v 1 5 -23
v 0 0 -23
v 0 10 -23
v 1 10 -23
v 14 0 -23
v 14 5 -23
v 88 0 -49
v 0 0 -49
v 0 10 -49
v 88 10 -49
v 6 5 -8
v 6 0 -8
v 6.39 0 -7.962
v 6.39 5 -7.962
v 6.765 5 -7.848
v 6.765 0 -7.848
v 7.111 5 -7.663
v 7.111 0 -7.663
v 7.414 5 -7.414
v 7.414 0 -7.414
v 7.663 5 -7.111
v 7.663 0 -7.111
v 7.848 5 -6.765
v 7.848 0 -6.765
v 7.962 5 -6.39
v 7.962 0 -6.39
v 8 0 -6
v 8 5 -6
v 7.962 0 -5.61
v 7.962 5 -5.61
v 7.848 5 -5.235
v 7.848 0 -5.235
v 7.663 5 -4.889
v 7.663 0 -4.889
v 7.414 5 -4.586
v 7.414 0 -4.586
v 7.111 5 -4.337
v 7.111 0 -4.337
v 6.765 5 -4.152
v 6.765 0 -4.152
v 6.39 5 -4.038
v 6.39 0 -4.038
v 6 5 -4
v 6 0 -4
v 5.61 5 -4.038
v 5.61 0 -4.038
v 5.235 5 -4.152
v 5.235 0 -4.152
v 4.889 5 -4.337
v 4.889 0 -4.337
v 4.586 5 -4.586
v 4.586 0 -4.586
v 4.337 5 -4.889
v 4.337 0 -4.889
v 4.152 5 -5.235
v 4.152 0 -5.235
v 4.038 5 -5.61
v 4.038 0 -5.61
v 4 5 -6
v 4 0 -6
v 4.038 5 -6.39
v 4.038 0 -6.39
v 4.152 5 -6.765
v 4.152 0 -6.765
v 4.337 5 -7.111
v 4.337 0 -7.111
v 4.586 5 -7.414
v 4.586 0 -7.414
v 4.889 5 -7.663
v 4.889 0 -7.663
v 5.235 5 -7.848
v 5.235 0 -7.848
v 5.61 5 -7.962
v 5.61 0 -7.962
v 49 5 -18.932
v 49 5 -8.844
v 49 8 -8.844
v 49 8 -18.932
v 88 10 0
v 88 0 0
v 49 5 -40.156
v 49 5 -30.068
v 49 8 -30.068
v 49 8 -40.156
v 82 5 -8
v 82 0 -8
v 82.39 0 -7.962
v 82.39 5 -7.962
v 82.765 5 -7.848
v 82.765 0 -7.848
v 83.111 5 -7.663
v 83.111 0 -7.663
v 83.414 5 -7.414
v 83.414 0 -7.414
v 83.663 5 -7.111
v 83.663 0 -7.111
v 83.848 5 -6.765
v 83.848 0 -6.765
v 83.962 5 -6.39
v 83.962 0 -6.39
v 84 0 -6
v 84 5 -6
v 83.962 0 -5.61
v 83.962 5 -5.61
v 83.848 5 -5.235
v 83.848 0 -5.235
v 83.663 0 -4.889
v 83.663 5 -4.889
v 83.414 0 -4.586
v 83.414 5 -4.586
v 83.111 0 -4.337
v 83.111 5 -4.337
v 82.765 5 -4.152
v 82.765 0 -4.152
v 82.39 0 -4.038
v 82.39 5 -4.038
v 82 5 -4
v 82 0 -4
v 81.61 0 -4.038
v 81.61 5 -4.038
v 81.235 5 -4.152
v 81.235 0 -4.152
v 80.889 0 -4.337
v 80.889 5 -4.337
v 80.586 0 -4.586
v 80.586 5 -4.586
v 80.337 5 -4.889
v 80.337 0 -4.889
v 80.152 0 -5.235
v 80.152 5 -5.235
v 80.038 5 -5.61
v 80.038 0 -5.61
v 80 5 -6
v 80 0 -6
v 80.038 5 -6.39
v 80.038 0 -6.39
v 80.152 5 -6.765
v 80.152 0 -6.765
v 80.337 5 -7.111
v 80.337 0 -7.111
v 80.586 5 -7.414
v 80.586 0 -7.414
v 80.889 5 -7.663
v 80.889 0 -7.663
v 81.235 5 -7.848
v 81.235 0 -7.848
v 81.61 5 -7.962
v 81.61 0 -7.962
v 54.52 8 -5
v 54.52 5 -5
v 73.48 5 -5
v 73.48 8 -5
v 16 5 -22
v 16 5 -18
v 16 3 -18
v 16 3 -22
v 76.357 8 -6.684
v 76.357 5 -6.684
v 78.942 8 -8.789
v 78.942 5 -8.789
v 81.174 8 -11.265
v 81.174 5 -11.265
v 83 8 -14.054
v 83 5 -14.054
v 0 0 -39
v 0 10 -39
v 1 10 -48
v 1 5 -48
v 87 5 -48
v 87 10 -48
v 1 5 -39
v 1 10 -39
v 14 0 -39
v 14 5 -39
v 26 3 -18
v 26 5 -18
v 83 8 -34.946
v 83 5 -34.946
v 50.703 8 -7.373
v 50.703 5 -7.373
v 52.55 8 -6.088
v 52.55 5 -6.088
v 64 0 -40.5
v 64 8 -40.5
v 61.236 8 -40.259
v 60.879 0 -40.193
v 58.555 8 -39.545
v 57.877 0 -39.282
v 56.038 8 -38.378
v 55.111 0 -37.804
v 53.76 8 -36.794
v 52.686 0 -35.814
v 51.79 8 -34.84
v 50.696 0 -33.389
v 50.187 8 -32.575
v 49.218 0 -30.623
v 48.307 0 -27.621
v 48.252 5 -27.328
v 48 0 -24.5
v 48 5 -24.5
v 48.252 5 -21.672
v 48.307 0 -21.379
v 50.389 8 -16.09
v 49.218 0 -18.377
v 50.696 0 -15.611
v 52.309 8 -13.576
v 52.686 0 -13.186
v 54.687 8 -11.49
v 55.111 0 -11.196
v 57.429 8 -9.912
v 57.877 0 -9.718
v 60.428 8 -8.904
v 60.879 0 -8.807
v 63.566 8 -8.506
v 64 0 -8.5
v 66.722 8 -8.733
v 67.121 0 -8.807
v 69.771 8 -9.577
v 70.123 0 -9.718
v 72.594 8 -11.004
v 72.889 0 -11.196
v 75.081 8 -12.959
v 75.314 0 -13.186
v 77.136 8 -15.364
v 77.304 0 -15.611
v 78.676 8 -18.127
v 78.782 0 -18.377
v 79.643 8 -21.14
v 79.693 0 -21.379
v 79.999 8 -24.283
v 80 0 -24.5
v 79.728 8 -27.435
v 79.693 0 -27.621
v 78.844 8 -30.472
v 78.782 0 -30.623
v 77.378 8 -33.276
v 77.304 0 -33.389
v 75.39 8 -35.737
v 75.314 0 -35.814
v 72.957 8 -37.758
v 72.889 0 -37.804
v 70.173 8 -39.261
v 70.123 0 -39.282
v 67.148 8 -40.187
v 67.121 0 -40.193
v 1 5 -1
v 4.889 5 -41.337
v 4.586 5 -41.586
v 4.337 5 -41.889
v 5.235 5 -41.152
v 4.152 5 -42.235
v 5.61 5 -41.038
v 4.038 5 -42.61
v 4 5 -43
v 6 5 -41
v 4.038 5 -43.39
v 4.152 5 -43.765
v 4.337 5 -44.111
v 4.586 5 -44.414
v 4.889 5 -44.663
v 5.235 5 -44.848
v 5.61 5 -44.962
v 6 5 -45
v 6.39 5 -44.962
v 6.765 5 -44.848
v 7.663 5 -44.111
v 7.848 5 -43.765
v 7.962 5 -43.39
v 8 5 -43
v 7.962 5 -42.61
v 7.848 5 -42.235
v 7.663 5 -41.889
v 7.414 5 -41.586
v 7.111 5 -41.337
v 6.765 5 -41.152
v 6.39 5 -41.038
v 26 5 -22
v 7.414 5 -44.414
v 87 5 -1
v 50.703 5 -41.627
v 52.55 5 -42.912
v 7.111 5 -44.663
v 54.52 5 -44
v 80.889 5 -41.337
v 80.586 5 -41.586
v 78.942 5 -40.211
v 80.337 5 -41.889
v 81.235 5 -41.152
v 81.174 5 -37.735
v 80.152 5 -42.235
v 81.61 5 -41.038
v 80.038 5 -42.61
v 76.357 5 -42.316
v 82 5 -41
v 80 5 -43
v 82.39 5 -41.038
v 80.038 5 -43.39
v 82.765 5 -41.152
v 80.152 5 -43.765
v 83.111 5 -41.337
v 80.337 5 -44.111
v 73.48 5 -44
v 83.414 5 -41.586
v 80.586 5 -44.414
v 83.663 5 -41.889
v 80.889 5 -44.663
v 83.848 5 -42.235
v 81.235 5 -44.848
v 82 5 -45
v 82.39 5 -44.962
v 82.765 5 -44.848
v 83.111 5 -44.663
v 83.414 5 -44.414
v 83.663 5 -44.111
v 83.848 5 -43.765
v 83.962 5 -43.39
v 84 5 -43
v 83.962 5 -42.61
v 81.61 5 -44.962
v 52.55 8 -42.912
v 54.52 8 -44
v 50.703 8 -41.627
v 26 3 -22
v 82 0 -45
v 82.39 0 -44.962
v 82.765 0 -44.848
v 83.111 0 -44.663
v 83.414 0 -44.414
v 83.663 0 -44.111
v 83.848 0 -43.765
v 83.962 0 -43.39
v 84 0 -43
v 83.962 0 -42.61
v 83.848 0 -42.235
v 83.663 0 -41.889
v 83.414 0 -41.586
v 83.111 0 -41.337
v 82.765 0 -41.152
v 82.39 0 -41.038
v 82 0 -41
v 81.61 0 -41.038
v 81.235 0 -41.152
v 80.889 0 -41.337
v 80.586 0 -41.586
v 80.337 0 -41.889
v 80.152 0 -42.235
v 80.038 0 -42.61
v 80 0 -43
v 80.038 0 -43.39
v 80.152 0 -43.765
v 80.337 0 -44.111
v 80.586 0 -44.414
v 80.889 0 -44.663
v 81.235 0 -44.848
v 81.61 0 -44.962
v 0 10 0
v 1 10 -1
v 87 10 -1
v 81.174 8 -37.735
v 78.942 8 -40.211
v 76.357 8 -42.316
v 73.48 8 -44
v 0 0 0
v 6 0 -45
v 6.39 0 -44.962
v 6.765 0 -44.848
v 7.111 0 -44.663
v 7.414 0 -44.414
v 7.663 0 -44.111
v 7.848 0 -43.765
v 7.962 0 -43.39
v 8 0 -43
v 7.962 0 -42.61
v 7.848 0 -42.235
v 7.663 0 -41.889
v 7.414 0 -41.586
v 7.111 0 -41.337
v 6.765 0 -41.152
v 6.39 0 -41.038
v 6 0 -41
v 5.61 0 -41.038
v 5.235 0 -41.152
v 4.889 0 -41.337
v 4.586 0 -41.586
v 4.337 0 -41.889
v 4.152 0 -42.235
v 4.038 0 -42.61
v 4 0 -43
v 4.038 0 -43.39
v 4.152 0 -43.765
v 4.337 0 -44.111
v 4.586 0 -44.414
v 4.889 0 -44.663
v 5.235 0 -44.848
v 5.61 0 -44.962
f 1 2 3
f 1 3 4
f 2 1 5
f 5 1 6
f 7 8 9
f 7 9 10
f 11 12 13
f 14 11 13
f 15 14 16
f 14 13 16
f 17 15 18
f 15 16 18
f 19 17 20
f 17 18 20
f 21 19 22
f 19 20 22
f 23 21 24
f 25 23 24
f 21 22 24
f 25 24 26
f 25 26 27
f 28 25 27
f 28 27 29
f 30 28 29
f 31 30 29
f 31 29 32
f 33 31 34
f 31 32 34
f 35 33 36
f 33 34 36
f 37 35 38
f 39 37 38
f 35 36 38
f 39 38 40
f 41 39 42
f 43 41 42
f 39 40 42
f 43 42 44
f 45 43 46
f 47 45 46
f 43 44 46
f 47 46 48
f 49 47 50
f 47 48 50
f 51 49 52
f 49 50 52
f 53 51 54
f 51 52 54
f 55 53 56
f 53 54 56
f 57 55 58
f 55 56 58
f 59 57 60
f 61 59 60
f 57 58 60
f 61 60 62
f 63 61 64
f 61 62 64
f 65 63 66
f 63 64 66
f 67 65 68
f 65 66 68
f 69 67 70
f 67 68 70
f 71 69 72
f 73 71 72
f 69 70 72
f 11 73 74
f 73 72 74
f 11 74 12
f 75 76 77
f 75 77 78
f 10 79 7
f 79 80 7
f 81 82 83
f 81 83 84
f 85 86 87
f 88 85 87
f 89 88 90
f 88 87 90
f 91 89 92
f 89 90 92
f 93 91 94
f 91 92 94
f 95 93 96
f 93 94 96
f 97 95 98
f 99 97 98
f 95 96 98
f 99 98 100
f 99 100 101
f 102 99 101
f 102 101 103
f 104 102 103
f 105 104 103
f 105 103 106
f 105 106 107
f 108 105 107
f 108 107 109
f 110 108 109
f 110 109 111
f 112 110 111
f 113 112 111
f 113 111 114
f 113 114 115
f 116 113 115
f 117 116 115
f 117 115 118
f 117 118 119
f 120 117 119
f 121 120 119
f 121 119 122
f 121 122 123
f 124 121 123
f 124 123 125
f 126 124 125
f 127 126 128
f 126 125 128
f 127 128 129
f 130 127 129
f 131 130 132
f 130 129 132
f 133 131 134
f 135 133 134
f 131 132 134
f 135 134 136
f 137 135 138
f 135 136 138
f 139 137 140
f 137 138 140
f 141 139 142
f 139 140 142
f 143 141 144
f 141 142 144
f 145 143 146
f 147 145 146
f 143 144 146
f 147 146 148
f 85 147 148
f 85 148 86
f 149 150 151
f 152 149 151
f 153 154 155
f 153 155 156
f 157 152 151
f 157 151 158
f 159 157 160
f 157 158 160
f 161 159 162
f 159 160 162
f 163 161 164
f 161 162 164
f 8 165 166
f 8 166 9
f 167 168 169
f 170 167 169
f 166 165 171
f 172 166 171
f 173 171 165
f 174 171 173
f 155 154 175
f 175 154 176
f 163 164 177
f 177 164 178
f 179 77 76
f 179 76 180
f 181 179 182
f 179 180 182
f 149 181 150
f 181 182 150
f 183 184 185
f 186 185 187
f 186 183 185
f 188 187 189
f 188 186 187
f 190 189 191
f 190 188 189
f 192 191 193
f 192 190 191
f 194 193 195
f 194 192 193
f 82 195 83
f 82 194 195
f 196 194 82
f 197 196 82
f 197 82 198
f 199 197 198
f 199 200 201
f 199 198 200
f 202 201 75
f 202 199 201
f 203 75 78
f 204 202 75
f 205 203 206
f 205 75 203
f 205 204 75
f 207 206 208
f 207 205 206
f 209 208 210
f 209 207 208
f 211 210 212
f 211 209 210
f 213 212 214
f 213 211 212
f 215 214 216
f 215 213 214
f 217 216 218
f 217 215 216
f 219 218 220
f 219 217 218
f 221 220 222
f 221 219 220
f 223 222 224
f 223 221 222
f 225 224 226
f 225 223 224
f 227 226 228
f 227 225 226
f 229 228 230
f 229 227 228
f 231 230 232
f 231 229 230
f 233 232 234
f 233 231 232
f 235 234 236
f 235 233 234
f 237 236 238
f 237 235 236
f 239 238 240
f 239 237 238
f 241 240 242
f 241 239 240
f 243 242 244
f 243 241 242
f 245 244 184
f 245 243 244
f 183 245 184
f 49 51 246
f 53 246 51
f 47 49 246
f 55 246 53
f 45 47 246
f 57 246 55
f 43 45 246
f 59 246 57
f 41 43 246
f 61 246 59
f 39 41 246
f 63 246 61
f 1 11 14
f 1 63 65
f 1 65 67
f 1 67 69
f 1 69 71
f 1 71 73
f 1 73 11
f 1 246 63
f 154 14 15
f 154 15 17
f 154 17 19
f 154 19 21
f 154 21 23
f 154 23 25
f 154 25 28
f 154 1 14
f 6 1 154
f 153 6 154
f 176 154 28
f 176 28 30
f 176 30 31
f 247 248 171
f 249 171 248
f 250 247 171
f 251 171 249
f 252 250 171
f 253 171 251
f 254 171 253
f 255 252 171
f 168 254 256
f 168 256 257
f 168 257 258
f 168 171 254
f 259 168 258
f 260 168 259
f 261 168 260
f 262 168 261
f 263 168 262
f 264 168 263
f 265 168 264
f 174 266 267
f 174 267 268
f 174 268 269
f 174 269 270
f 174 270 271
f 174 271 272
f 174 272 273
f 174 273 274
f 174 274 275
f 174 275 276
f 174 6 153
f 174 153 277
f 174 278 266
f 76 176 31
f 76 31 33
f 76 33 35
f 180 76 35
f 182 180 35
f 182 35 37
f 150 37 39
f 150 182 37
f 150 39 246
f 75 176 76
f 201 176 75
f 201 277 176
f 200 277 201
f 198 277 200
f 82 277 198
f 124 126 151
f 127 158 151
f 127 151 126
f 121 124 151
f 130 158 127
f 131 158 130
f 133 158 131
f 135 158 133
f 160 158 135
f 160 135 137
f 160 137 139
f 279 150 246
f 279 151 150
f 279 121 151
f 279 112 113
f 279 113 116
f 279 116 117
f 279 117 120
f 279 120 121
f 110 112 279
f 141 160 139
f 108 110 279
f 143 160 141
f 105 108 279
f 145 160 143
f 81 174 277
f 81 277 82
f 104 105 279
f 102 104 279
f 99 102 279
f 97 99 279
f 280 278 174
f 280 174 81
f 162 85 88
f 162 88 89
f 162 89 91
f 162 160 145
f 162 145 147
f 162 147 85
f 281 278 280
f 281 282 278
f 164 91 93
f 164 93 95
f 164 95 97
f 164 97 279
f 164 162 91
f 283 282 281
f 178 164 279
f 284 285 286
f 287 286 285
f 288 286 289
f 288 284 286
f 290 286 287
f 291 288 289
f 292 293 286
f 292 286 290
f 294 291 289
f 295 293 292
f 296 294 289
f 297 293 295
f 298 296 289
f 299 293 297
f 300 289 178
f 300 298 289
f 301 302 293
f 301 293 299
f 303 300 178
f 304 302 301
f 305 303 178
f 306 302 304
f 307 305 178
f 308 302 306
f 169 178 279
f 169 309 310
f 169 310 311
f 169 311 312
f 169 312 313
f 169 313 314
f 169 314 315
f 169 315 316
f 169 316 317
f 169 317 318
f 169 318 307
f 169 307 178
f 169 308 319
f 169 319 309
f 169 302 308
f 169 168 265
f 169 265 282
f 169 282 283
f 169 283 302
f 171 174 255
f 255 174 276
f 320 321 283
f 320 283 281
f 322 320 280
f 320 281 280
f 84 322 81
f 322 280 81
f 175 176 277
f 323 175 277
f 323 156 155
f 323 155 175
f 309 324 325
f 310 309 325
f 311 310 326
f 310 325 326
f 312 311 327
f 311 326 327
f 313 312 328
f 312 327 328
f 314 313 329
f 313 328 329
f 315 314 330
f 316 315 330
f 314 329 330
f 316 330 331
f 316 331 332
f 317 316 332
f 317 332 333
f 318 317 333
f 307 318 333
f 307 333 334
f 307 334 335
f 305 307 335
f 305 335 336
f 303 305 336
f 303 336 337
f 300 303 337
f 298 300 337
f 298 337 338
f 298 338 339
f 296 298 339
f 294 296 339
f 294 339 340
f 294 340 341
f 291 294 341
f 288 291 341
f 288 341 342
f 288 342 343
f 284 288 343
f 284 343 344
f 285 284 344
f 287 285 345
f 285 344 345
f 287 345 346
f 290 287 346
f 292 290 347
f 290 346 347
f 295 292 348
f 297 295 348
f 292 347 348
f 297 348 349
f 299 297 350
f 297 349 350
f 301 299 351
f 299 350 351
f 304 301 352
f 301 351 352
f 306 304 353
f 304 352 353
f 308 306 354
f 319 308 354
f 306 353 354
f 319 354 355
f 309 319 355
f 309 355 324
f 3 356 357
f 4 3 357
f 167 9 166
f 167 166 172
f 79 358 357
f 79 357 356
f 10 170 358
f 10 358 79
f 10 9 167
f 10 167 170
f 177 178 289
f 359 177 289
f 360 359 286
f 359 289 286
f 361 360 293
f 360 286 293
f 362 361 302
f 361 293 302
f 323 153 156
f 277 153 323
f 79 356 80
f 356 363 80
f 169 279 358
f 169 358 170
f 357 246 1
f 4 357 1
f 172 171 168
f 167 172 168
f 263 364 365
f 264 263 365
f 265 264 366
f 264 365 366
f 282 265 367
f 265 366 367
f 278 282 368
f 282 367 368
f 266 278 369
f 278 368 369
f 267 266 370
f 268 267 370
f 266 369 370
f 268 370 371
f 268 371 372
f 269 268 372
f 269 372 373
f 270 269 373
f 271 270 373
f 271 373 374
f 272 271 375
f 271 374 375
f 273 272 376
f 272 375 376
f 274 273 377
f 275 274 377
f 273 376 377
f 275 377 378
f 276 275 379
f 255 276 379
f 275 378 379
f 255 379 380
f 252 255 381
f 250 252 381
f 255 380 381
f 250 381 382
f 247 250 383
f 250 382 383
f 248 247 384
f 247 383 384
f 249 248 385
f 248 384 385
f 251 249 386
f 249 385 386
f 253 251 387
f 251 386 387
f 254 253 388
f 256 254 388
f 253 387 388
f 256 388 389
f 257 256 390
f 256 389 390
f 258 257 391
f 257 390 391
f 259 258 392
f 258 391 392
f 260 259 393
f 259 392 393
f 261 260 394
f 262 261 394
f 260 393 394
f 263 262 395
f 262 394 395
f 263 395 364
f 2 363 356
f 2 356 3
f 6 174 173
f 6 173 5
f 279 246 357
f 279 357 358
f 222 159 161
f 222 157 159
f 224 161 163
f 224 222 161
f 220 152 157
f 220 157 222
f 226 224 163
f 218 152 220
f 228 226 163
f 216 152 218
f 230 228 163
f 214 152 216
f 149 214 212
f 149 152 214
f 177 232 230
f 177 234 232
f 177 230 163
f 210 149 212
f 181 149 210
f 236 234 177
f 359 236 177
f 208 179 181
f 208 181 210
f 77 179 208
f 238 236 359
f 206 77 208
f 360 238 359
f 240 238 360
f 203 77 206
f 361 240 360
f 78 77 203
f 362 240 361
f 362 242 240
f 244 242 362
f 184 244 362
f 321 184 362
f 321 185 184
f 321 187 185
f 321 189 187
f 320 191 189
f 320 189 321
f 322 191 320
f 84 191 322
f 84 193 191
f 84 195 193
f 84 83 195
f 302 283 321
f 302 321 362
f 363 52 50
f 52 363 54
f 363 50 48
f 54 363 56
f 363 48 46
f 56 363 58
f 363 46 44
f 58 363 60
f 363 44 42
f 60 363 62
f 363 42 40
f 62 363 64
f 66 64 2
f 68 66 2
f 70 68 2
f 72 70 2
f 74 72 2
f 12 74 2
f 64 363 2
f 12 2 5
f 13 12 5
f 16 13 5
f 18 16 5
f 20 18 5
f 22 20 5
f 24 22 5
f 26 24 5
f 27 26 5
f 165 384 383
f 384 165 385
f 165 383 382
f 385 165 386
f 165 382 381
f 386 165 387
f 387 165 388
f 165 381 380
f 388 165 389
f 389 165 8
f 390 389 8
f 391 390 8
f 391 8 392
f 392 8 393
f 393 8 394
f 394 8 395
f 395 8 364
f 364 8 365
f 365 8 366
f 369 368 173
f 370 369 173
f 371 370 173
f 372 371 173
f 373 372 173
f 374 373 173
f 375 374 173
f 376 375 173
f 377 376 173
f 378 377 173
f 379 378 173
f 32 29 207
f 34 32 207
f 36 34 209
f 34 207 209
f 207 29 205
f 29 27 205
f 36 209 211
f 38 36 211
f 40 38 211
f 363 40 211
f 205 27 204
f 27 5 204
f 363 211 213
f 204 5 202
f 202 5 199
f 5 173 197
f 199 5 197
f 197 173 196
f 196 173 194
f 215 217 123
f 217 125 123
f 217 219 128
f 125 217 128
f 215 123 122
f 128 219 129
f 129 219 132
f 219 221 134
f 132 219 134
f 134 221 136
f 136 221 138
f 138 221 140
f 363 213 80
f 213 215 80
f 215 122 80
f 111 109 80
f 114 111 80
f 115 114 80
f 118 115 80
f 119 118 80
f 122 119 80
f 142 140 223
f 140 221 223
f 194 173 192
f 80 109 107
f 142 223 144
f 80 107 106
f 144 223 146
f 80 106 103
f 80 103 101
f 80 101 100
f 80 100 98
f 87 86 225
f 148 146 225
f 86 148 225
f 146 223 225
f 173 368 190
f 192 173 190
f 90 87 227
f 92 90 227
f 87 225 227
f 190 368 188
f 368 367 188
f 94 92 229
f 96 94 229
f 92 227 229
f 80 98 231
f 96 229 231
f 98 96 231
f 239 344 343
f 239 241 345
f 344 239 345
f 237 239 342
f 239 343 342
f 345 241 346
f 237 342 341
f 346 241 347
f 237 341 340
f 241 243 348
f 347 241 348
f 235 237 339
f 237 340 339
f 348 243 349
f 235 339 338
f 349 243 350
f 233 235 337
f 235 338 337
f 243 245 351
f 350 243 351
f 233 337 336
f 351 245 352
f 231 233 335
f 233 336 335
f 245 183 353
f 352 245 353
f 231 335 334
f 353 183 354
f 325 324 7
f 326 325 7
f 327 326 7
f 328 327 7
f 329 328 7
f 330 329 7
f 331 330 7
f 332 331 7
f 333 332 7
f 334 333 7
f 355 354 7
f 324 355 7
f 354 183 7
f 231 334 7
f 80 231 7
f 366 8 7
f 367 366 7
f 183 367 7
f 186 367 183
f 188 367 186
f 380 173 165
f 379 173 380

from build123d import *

# Parameters (mm, degrees)
SKETCH1_W           = 88
SKETCH1_H           = 49
BOSS_EXTRUDE1_DEPTH = 5
SKETCH2_W           = 88
SKETCH2_H           = 49
SKETCH2_W_2         = 86
SKETCH2_H_2         = 47
BOSS_EXTRUDE2_DEPTH = 5
SKETCH3_R           = 16
CUT_EXTRUDE1_DEPTH  = 5
CUT_EXTRUDE2_START  = -10
SKETCH4_W           = 14
SKETCH4_H           = 16
CUT_EXTRUDE2_DEPTH  = 10
SKETCH5_W           = 10
SKETCH5_H           = 4
CUT_EXTRUDE3_DEPTH  = 2
SKETCH6_R           = 21.682235108
SKETCH6_R_2         = 16
BOSS_EXTRUDE3_DEPTH = 3
SKETCH7_W           = 10
SKETCH7_H           = 35.531306717
CUT_EXTRUDE4_DEPTH  = 3
SKETCH8_R           = 2
CUT_EXTRUDE5_DEPTH  = 5
SKETCH9_W           = 40.675164953
SKETCH9_H           = 47
SKETCH9_W_2         = 34.982420928
SKETCH9_H_2         = 39
CUT_EXTRUDE6_DEPTH  = 3


with BuildPart() as part:
    # Sketch1 → Boss-Extrude1 (new body)
    with BuildSketch(Plane(origin=(0, 0, 0), x_dir=(1, 0, 0), z_dir=(0, 1, 0))):
        with Locations((44, 24.5)):
            Rectangle(SKETCH1_W, SKETCH1_H)
    extrude(amount=BOSS_EXTRUDE1_DEPTH)

    # Sketch2 → Boss-Extrude2 (add)
    with BuildSketch(Plane(origin=(0, 5, 0), x_dir=(1, 0, 0), z_dir=(0, 1, 0))):
        with Locations((44, 24.5)):
            Rectangle(SKETCH2_W, SKETCH2_H)
        with Locations((44, 24.5)):
            Rectangle(SKETCH2_W_2, SKETCH2_H_2, mode=Mode.SUBTRACT)
    extrude(amount=BOSS_EXTRUDE2_DEPTH)

    # Sketch3 → Cut-Extrude1 (cut)
    with BuildSketch(Plane(origin=(0, 0, 0), x_dir=(-1, 0, 0), z_dir=(0, -1, 0))):
        with Locations(Location((-64, 24.5, 0), (0, 0, 90))):
            Circle(SKETCH3_R)
    extrude(amount=-CUT_EXTRUDE1_DEPTH, mode=Mode.SUBTRACT)

    # Sketch4 → Cut-Extrude2 (cut)
    with BuildSketch(Plane.XZ.offset(CUT_EXTRUDE2_START)):
        with Locations((7, -31)):
            Rectangle(SKETCH4_W, SKETCH4_H)
    extrude(amount=CUT_EXTRUDE2_DEPTH, mode=Mode.SUBTRACT)

    # Sketch5 → Cut-Extrude3 (cut)
    with BuildSketch(Plane(origin=(0, 5, 0), x_dir=(1, 0, 0), z_dir=(0, 1, 0))):
        with Locations((21, 20)):
            Rectangle(SKETCH5_W, SKETCH5_H)
    extrude(amount=-CUT_EXTRUDE3_DEPTH, mode=Mode.SUBTRACT)

    # Sketch6 → Boss-Extrude3 (add)
    with BuildSketch(Plane(origin=(0, 5, 0), x_dir=(1, 0, 0), z_dir=(0, 1, 0))):
        with Locations(Location((64, 24.5, 0), (0, 0, 90))):
            Circle(SKETCH6_R)
        with Locations(Location((64, 24.5, 0), (0, 0, 90))):
            Circle(SKETCH6_R_2, mode=Mode.SUBTRACT)
    extrude(amount=BOSS_EXTRUDE3_DEPTH)

    # Sketch7 → Cut-Extrude4 (cut)
    with BuildSketch(Plane(origin=(0, 5, 0), x_dir=(1, 0, 0), z_dir=(0, 1, 0))):
        with Locations((44, 25.309726248)):
            Rectangle(SKETCH7_W, SKETCH7_H)
    extrude(amount=CUT_EXTRUDE4_DEPTH, mode=Mode.SUBTRACT)

    # Sketch8 → Cut-Extrude5 (cut)
    with BuildSketch(Plane(origin=(0, 0, 0), x_dir=(-1, 0, 0), z_dir=(0, -1, 0))):
        with Locations(Location((-82, 6, 0), (0, 0, 90))):
            Circle(SKETCH8_R)
        with Locations(Location((-6, 6, 0), (0, 0, 90))):
            Circle(SKETCH8_R)
        with Locations(Location((-6, 43, 0), (0, 0, 90))):
            Circle(SKETCH8_R)
        with Locations(Location((-82, 43, 0), (0, 0, 90))):
            Circle(SKETCH8_R)
    extrude(amount=-CUT_EXTRUDE5_DEPTH, mode=Mode.SUBTRACT)

    # Sketch9 → Cut-Extrude6 (cut)
    with BuildSketch(Plane(origin=(0, 5, 0), x_dir=(1, 0, 0), z_dir=(0, 1, 0))):
        with Locations((66.662417523, 24.5)):
            Rectangle(SKETCH9_W, SKETCH9_H)
        with Locations((65.508789536, 24.5)):
            Rectangle(SKETCH9_W_2, SKETCH9_H_2, mode=Mode.SUBTRACT)
    extrude(amount=CUT_EXTRUDE6_DEPTH, mode=Mode.SUBTRACT)


solid = part.part
